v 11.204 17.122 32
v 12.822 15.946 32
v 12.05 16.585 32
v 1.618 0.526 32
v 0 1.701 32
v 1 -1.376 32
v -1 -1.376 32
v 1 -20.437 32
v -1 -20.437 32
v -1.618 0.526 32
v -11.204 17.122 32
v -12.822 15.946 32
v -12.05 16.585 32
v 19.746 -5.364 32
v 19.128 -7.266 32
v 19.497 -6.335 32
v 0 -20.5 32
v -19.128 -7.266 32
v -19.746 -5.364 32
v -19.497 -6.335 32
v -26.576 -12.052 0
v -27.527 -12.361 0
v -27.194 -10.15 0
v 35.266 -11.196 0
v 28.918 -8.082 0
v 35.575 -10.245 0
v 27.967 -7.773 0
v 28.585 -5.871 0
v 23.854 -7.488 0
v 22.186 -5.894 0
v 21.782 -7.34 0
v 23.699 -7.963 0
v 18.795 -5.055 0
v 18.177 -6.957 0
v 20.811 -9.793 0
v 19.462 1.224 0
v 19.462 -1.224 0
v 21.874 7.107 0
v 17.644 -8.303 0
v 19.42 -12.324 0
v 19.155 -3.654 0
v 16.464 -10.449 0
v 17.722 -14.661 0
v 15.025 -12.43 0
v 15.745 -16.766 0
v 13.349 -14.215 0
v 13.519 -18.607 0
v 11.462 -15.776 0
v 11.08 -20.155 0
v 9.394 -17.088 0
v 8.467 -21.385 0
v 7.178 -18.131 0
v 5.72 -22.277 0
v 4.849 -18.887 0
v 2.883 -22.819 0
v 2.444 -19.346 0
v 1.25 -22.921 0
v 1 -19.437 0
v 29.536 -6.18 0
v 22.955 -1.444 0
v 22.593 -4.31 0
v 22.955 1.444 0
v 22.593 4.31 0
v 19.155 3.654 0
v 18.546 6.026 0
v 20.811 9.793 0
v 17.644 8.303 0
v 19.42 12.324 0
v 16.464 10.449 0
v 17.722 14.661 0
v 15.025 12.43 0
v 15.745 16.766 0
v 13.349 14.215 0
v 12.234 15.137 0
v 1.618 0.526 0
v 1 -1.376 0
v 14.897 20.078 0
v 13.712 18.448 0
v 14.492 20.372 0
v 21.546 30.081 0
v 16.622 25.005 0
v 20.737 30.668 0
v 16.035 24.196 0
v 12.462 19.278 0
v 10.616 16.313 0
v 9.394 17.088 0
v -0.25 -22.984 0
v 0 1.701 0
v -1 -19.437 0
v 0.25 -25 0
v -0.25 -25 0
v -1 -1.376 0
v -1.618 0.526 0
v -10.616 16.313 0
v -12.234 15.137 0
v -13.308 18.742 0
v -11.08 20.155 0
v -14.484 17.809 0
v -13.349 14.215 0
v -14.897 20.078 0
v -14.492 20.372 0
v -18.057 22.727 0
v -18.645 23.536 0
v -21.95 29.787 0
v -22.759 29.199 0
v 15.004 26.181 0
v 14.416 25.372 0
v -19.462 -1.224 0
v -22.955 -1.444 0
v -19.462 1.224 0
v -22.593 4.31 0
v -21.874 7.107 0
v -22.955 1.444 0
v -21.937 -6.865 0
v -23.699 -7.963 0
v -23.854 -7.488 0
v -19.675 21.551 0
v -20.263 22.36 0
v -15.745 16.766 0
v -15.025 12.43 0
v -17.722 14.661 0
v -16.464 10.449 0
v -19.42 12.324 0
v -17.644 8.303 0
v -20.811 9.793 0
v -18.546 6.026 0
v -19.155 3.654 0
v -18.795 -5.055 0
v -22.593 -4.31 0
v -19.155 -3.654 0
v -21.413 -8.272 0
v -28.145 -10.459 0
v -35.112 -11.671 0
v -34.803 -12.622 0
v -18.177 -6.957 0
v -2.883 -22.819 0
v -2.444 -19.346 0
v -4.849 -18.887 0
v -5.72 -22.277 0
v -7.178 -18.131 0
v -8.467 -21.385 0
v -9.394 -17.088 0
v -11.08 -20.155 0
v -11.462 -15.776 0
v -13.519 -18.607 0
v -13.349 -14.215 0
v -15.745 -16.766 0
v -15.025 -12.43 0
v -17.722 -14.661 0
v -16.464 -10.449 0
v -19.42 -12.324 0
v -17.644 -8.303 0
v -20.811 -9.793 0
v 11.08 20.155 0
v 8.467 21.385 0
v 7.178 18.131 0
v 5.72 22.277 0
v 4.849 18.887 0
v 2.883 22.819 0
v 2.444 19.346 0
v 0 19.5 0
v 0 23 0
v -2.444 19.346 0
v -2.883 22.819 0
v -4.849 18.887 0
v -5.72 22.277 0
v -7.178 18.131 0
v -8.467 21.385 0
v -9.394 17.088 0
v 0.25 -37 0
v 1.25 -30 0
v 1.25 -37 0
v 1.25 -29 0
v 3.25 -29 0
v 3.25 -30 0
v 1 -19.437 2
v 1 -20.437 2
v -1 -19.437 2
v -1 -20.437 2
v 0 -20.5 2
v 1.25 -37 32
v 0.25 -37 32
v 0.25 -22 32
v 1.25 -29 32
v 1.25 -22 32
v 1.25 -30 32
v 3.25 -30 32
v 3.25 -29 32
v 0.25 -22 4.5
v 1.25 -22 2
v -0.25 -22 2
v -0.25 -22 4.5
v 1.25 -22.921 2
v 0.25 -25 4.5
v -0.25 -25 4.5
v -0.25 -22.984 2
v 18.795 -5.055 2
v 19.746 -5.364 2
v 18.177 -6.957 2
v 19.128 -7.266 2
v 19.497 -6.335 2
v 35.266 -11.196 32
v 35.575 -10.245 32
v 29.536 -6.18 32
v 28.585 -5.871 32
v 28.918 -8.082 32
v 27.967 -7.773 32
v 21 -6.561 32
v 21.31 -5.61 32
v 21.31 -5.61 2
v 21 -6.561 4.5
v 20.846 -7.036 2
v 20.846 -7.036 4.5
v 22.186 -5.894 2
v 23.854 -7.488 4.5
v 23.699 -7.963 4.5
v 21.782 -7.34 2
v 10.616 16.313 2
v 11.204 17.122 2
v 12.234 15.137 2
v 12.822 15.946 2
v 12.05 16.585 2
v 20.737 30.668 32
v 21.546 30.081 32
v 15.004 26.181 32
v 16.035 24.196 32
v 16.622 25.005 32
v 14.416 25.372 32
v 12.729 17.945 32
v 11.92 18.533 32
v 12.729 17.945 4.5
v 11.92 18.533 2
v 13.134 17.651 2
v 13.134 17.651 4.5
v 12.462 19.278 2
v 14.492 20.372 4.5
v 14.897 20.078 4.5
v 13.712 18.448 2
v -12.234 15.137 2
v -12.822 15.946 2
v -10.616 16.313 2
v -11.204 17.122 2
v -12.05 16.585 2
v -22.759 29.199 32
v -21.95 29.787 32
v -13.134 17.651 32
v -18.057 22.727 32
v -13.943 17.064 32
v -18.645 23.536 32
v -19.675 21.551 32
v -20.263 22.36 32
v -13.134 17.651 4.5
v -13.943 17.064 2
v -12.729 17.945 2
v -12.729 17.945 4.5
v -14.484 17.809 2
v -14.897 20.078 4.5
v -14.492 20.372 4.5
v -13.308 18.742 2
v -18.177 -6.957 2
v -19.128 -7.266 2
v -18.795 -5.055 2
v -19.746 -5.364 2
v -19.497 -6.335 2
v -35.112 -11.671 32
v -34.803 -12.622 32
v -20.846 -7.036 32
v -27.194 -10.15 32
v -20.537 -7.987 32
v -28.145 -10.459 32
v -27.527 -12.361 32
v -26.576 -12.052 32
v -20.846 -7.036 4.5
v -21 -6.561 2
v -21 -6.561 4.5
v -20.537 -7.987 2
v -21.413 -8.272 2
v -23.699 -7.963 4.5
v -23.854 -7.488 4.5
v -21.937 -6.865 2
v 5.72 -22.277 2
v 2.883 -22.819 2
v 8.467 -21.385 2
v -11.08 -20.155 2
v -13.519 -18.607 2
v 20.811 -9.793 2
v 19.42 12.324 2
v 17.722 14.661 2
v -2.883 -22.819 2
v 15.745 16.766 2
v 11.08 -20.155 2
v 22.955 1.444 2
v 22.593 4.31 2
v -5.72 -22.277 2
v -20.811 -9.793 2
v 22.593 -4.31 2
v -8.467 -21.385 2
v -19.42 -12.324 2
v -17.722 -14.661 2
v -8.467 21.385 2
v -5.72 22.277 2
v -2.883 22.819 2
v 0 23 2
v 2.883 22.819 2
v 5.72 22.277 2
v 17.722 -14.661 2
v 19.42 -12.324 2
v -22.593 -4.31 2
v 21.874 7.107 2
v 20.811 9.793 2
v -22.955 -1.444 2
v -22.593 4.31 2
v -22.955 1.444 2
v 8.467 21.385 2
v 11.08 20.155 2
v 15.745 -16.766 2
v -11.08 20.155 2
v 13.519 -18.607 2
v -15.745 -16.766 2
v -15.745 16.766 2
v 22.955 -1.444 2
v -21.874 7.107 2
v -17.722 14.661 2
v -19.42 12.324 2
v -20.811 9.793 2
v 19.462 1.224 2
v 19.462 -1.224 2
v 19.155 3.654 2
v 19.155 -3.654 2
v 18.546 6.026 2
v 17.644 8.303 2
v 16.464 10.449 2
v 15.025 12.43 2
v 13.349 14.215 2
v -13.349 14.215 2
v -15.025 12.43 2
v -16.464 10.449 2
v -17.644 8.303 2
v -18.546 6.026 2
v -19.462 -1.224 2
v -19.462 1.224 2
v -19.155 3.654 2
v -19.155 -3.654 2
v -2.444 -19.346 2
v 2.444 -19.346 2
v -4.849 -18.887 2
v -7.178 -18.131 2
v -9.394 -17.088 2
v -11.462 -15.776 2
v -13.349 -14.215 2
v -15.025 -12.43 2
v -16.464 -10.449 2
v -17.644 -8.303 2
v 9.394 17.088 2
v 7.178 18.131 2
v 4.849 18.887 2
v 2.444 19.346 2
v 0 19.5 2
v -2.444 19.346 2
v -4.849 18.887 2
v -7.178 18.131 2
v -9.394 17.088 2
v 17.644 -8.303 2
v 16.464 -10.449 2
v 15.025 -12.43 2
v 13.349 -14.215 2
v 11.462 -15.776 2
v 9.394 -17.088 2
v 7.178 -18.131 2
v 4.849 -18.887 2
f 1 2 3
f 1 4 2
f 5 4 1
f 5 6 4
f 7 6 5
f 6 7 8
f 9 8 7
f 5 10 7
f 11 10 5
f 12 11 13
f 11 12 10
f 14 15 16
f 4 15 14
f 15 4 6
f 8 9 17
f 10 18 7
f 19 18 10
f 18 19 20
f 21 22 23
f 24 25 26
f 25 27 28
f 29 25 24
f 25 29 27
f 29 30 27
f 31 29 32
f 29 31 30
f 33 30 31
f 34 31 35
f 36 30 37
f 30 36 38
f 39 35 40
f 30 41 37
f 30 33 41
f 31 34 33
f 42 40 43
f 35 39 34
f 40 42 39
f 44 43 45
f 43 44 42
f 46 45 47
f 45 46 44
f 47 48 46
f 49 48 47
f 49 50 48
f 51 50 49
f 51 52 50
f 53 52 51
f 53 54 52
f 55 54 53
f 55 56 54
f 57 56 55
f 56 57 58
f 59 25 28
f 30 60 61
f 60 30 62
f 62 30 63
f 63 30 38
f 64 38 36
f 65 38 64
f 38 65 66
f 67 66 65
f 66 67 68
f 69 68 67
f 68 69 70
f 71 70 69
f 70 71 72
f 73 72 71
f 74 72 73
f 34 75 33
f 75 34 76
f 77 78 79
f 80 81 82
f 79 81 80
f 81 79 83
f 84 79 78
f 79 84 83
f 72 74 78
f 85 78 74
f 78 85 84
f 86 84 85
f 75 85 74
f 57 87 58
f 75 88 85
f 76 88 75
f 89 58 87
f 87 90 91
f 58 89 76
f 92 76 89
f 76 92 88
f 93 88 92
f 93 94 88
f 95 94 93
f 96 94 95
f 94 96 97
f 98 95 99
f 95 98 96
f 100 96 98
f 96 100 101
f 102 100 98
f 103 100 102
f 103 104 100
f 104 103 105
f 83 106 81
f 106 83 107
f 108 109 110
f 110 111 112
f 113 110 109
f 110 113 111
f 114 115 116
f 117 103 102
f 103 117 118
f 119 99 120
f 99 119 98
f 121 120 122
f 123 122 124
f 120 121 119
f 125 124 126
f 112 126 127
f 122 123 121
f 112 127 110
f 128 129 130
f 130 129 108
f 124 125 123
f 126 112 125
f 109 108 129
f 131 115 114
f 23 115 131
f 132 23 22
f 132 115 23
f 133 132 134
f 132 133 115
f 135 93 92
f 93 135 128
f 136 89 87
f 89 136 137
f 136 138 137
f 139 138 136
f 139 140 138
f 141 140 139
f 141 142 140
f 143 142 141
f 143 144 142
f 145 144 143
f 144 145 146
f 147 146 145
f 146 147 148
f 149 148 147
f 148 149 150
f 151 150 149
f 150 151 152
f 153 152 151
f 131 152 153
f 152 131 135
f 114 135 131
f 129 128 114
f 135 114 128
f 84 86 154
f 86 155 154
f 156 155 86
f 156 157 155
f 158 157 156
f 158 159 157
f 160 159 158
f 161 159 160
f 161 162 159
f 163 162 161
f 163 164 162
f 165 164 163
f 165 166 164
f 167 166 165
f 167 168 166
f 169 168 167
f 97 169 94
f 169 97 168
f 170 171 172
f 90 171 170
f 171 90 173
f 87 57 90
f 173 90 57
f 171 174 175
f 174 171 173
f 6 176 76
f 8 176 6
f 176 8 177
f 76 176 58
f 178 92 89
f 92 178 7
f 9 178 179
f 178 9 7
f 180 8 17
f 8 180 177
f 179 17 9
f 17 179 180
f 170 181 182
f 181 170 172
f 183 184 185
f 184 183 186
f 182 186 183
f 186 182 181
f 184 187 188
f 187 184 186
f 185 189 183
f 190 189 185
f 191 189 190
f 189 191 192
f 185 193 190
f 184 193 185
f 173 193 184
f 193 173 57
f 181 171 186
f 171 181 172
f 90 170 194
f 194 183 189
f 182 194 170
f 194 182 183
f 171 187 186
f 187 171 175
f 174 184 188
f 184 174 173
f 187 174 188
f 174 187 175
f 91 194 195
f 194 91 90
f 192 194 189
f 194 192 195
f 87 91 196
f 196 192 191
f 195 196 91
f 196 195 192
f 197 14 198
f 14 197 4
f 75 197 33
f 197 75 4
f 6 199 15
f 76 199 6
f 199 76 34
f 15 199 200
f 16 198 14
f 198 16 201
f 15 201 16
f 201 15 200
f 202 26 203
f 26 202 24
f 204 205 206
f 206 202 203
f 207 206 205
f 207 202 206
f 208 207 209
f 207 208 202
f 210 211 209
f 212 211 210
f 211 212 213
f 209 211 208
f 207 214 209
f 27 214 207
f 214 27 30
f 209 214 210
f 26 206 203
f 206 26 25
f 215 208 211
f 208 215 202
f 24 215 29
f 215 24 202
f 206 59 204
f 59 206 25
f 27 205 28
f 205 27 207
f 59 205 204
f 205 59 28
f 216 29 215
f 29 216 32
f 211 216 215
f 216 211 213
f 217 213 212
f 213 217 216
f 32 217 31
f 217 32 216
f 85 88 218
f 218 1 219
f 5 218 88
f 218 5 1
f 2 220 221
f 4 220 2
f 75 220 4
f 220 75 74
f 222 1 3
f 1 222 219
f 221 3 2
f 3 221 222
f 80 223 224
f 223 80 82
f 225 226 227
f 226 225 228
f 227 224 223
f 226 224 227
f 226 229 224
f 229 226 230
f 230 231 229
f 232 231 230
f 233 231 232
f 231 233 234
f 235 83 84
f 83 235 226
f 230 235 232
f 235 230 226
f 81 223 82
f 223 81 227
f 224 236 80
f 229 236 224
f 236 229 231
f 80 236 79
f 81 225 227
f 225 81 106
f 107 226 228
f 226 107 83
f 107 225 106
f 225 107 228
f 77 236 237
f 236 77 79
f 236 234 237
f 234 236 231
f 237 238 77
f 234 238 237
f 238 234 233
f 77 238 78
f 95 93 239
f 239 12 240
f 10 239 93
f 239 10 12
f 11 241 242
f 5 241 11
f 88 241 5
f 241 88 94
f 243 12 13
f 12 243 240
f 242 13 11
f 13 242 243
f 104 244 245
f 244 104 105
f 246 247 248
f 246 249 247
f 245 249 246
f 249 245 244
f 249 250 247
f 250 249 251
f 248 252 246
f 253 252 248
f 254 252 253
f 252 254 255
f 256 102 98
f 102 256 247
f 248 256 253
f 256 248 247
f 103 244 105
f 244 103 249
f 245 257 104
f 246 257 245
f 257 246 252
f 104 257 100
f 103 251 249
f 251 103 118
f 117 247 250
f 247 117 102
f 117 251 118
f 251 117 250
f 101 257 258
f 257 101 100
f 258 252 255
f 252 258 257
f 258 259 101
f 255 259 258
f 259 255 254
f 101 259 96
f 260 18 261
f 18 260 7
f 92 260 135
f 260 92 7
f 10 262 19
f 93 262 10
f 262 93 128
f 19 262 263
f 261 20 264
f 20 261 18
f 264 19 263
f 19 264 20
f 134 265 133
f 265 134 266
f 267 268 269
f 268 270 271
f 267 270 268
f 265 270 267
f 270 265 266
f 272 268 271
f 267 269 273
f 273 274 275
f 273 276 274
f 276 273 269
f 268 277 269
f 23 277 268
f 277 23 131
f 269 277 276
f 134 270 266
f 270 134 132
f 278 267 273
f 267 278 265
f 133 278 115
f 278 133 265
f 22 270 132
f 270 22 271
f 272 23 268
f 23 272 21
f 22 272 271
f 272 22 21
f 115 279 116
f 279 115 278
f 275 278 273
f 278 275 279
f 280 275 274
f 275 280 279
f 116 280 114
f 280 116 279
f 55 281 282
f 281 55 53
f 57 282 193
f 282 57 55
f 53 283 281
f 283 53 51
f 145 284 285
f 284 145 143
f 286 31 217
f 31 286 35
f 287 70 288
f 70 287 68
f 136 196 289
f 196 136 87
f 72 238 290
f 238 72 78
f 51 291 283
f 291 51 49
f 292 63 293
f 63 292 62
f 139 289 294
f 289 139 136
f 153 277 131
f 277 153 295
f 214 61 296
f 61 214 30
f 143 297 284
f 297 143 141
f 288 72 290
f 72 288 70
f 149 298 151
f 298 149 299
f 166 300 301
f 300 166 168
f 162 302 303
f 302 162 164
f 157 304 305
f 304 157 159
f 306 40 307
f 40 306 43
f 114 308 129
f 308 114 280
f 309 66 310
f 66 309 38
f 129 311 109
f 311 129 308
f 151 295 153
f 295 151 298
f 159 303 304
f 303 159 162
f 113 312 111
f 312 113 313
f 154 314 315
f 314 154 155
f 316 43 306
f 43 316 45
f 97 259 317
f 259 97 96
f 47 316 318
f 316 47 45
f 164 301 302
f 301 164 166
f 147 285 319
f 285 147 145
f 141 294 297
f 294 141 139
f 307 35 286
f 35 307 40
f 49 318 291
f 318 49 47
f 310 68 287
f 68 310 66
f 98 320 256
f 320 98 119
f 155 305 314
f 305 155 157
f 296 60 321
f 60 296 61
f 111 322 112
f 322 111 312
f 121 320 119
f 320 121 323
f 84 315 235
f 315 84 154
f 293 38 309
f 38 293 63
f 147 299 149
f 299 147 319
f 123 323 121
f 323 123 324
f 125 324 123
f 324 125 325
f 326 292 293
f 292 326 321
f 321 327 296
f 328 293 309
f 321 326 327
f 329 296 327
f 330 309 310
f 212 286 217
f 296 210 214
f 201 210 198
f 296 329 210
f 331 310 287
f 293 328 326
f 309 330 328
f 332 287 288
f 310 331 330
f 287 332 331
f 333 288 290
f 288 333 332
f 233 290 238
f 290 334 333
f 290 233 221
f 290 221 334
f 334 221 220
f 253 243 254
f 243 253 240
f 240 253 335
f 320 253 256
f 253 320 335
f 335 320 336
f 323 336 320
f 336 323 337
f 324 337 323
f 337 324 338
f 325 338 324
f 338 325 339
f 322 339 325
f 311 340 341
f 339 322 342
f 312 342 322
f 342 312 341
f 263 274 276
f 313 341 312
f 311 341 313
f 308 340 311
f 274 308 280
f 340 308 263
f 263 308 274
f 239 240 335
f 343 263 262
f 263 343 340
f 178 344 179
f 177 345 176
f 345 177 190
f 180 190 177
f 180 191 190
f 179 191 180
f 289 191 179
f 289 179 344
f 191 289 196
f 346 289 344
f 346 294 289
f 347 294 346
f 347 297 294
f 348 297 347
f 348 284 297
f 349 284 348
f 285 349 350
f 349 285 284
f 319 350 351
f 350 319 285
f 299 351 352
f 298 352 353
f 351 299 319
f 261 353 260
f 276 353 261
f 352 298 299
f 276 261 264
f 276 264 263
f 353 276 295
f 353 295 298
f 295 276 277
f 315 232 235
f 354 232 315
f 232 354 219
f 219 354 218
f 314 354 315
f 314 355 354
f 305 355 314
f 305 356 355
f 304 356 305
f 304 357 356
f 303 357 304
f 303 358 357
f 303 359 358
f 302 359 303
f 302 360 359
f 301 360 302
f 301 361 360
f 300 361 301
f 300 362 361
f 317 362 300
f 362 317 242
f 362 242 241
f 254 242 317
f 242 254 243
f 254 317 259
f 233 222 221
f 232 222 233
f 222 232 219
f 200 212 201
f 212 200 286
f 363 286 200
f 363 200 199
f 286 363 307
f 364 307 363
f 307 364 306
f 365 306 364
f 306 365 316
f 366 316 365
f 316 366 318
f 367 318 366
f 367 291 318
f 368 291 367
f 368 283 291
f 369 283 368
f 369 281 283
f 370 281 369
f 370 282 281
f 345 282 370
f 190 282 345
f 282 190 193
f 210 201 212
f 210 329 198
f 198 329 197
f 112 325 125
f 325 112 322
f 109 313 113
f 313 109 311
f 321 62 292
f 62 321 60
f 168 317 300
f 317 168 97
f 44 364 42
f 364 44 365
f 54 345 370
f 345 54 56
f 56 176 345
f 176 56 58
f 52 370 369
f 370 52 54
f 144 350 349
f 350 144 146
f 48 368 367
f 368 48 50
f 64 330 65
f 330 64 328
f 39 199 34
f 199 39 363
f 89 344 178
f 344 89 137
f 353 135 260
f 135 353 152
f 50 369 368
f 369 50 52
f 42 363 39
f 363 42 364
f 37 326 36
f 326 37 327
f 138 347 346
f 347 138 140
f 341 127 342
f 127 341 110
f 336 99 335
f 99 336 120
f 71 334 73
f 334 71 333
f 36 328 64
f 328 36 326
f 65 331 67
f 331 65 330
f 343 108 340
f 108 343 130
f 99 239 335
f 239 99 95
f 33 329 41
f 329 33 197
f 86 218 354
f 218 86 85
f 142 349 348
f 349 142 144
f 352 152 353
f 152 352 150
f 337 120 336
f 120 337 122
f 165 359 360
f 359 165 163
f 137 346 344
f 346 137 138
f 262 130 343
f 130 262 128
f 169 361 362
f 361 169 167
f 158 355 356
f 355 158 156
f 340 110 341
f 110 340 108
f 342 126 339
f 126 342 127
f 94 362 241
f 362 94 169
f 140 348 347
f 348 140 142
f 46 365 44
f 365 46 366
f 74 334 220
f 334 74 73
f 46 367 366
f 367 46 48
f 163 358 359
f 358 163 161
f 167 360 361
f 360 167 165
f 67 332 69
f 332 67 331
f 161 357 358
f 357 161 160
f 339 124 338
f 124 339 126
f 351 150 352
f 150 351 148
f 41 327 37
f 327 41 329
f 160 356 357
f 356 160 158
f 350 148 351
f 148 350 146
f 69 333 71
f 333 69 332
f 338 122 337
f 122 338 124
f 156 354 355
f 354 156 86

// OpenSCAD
/*
 * Parametric Rocket Fin Guide
 *
 * by Alex Franke (CodeCreations), Jun 2012
 * http://www.theFrankes.com
 * 
 * Licenced under Creative Commons Attribution - Non-Commercial - Share Alike 3.0 
 * 
 * INSTRUCTIONS: Choose some values in the "User-defined values" section, render, print, smile
 *     broadly, share with friends, and send the author a few bottles of your favorite beer. 
 * 
 * v2.00, Jul 2, 2012: Added sleeve option for adding fins in middle of tube
 * v1.00, Jun 30, 2012: Initial release. 
 *
 */

/////////////////////////////////////////////////////////////////////////////
// User-defined values... 
/////////////////////////////////////////////////////////////////////////////

// Rocket Parameters

tubeOD              = 42;    // Outer diameter of the tube (rocket body)
tubeID              = 41;    // Inner diameter of the tube (rocket body)


// Fin Parameters
//      The fins are usually glued to the body of the rocket, near or at the bottom. Use 
//   finQty to specify one of more values indicating the number of fin supports to render.  
//   Setting finThickness is not critical, but will allow more perfect alignment. 
//      Somtimes you might want to add fins in different places (other than just the bottom).
//   In this case, set the baseThickness to a value that is sufficient for a stable fit, 
//   and set the sleeveOnly option to true. This will allow you to slide the guide onto 
//   the body of the rocket. 

finQty              = [5];   // One of more values specifying the number of fins
finThickness        = 0.5;   // Thickness of the fin material 
finHeight           = 15;    // The height of the fin supports, away from the rocket body
finLength           = 30;    // The length of the fin supports, along the rocket body
finElevation        = 2.5;   // The distance from the bottom that the fins should attach
finStandoff         = 2;     // Distance of fin supports from rocket body (room for glue)
finSupportThickness = 1;     // The thickness of the fin support material
finLedgeThickness   = 3;     // The thickness of the ledge used to vertically position the fin
finSpineLength      = 2;     // The length of the fin support rib 

tubeGuideThickness  = 2;     // The thickness of the structure that holds the tube
baseThickness       = 2;     // The thickness of the base of the jig

sleeveOnly          = false; // Set to true 

// Quality Parameters: 

$fn                 = 50;   // Default quality for most circle parts. 


/////////////////////////////////////////////////////////////////////////////
// Calculated values... 
/////////////////////////////////////////////////////////////////////////////

// Let's get some basic math out of the way first.
// ...what? No math? Well, maybe next time... 


/////////////////////////////////////////////////////////////////////////////
// Render the object...  
/////////////////////////////////////////////////////////////////////////////

rotate([0,0,-90]) // Rotate for printing with front-mounted fan
	finGuide();


/////////////////////////////////////////////////////////////////////////////
// Modules... 
/////////////////////////////////////////////////////////////////////////////

module finGuide() {

	difference() {
		union() {
			translate([0,0,(finLength+baseThickness)/2]) 
				fins();
			base(); 
		}
		
		if ( sleeveOnly ) 
			translate([0,0,-0.5]) 
				cylinder( r=tubeOD/2, h=finLength+baseThickness+1 ); 
	}
}

module base() {
	translate([0,0,baseThickness/2]) 
		tube( tubeOD+finStandoff+2, tubeID -2, baseThickness );
}

module fins() {
	for(set=finQty) {
		for(i=[0:set-1]) {
			rotate([0,0,i*360/set]) {
				innerStructure();
				fin();	
			}
		}
	}
}

module innerStructure() {
	intersection() {
		translate([tubeID/2/2,0, 0]) 
			cube([tubeID/2, tubeGuideThickness, finLength+baseThickness], center=true);
		cylinder( r=tubeID/2, h=finLength+baseThickness+1, center=true);
	}
}

module fin() {
	union() {
		// fin
		translate([	(tubeOD+finHeight+finStandoff)/2,
					(finSupportThickness+finThickness)/2, 
					0 ])
			cube([finHeight, finSupportThickness, finLength+baseThickness], center=true);

		// spine 
		translate([	(tubeOD+finHeight+finStandoff)/2,
					(finSpineLength+finThickness)/2 + finSupportThickness, 
					0 ])
			cube([finSupportThickness, finSpineLength, finLength+baseThickness], center=true);

		// elevation 
		translate([	(tubeOD+finLedgeThickness+finStandoff)/2,
					0,
					-(finLength+baseThickness)/2+(finElevation+baseThickness)/2	])
			cube([finLedgeThickness, finThickness, finElevation+baseThickness], center=true);
		
	}
}

module tube( od, id, height ) {
	difference() {
		cylinder(r=od/2, h=height, center=true);
		cylinder(r=id/2, h=height+1, center=true);
	}
}
